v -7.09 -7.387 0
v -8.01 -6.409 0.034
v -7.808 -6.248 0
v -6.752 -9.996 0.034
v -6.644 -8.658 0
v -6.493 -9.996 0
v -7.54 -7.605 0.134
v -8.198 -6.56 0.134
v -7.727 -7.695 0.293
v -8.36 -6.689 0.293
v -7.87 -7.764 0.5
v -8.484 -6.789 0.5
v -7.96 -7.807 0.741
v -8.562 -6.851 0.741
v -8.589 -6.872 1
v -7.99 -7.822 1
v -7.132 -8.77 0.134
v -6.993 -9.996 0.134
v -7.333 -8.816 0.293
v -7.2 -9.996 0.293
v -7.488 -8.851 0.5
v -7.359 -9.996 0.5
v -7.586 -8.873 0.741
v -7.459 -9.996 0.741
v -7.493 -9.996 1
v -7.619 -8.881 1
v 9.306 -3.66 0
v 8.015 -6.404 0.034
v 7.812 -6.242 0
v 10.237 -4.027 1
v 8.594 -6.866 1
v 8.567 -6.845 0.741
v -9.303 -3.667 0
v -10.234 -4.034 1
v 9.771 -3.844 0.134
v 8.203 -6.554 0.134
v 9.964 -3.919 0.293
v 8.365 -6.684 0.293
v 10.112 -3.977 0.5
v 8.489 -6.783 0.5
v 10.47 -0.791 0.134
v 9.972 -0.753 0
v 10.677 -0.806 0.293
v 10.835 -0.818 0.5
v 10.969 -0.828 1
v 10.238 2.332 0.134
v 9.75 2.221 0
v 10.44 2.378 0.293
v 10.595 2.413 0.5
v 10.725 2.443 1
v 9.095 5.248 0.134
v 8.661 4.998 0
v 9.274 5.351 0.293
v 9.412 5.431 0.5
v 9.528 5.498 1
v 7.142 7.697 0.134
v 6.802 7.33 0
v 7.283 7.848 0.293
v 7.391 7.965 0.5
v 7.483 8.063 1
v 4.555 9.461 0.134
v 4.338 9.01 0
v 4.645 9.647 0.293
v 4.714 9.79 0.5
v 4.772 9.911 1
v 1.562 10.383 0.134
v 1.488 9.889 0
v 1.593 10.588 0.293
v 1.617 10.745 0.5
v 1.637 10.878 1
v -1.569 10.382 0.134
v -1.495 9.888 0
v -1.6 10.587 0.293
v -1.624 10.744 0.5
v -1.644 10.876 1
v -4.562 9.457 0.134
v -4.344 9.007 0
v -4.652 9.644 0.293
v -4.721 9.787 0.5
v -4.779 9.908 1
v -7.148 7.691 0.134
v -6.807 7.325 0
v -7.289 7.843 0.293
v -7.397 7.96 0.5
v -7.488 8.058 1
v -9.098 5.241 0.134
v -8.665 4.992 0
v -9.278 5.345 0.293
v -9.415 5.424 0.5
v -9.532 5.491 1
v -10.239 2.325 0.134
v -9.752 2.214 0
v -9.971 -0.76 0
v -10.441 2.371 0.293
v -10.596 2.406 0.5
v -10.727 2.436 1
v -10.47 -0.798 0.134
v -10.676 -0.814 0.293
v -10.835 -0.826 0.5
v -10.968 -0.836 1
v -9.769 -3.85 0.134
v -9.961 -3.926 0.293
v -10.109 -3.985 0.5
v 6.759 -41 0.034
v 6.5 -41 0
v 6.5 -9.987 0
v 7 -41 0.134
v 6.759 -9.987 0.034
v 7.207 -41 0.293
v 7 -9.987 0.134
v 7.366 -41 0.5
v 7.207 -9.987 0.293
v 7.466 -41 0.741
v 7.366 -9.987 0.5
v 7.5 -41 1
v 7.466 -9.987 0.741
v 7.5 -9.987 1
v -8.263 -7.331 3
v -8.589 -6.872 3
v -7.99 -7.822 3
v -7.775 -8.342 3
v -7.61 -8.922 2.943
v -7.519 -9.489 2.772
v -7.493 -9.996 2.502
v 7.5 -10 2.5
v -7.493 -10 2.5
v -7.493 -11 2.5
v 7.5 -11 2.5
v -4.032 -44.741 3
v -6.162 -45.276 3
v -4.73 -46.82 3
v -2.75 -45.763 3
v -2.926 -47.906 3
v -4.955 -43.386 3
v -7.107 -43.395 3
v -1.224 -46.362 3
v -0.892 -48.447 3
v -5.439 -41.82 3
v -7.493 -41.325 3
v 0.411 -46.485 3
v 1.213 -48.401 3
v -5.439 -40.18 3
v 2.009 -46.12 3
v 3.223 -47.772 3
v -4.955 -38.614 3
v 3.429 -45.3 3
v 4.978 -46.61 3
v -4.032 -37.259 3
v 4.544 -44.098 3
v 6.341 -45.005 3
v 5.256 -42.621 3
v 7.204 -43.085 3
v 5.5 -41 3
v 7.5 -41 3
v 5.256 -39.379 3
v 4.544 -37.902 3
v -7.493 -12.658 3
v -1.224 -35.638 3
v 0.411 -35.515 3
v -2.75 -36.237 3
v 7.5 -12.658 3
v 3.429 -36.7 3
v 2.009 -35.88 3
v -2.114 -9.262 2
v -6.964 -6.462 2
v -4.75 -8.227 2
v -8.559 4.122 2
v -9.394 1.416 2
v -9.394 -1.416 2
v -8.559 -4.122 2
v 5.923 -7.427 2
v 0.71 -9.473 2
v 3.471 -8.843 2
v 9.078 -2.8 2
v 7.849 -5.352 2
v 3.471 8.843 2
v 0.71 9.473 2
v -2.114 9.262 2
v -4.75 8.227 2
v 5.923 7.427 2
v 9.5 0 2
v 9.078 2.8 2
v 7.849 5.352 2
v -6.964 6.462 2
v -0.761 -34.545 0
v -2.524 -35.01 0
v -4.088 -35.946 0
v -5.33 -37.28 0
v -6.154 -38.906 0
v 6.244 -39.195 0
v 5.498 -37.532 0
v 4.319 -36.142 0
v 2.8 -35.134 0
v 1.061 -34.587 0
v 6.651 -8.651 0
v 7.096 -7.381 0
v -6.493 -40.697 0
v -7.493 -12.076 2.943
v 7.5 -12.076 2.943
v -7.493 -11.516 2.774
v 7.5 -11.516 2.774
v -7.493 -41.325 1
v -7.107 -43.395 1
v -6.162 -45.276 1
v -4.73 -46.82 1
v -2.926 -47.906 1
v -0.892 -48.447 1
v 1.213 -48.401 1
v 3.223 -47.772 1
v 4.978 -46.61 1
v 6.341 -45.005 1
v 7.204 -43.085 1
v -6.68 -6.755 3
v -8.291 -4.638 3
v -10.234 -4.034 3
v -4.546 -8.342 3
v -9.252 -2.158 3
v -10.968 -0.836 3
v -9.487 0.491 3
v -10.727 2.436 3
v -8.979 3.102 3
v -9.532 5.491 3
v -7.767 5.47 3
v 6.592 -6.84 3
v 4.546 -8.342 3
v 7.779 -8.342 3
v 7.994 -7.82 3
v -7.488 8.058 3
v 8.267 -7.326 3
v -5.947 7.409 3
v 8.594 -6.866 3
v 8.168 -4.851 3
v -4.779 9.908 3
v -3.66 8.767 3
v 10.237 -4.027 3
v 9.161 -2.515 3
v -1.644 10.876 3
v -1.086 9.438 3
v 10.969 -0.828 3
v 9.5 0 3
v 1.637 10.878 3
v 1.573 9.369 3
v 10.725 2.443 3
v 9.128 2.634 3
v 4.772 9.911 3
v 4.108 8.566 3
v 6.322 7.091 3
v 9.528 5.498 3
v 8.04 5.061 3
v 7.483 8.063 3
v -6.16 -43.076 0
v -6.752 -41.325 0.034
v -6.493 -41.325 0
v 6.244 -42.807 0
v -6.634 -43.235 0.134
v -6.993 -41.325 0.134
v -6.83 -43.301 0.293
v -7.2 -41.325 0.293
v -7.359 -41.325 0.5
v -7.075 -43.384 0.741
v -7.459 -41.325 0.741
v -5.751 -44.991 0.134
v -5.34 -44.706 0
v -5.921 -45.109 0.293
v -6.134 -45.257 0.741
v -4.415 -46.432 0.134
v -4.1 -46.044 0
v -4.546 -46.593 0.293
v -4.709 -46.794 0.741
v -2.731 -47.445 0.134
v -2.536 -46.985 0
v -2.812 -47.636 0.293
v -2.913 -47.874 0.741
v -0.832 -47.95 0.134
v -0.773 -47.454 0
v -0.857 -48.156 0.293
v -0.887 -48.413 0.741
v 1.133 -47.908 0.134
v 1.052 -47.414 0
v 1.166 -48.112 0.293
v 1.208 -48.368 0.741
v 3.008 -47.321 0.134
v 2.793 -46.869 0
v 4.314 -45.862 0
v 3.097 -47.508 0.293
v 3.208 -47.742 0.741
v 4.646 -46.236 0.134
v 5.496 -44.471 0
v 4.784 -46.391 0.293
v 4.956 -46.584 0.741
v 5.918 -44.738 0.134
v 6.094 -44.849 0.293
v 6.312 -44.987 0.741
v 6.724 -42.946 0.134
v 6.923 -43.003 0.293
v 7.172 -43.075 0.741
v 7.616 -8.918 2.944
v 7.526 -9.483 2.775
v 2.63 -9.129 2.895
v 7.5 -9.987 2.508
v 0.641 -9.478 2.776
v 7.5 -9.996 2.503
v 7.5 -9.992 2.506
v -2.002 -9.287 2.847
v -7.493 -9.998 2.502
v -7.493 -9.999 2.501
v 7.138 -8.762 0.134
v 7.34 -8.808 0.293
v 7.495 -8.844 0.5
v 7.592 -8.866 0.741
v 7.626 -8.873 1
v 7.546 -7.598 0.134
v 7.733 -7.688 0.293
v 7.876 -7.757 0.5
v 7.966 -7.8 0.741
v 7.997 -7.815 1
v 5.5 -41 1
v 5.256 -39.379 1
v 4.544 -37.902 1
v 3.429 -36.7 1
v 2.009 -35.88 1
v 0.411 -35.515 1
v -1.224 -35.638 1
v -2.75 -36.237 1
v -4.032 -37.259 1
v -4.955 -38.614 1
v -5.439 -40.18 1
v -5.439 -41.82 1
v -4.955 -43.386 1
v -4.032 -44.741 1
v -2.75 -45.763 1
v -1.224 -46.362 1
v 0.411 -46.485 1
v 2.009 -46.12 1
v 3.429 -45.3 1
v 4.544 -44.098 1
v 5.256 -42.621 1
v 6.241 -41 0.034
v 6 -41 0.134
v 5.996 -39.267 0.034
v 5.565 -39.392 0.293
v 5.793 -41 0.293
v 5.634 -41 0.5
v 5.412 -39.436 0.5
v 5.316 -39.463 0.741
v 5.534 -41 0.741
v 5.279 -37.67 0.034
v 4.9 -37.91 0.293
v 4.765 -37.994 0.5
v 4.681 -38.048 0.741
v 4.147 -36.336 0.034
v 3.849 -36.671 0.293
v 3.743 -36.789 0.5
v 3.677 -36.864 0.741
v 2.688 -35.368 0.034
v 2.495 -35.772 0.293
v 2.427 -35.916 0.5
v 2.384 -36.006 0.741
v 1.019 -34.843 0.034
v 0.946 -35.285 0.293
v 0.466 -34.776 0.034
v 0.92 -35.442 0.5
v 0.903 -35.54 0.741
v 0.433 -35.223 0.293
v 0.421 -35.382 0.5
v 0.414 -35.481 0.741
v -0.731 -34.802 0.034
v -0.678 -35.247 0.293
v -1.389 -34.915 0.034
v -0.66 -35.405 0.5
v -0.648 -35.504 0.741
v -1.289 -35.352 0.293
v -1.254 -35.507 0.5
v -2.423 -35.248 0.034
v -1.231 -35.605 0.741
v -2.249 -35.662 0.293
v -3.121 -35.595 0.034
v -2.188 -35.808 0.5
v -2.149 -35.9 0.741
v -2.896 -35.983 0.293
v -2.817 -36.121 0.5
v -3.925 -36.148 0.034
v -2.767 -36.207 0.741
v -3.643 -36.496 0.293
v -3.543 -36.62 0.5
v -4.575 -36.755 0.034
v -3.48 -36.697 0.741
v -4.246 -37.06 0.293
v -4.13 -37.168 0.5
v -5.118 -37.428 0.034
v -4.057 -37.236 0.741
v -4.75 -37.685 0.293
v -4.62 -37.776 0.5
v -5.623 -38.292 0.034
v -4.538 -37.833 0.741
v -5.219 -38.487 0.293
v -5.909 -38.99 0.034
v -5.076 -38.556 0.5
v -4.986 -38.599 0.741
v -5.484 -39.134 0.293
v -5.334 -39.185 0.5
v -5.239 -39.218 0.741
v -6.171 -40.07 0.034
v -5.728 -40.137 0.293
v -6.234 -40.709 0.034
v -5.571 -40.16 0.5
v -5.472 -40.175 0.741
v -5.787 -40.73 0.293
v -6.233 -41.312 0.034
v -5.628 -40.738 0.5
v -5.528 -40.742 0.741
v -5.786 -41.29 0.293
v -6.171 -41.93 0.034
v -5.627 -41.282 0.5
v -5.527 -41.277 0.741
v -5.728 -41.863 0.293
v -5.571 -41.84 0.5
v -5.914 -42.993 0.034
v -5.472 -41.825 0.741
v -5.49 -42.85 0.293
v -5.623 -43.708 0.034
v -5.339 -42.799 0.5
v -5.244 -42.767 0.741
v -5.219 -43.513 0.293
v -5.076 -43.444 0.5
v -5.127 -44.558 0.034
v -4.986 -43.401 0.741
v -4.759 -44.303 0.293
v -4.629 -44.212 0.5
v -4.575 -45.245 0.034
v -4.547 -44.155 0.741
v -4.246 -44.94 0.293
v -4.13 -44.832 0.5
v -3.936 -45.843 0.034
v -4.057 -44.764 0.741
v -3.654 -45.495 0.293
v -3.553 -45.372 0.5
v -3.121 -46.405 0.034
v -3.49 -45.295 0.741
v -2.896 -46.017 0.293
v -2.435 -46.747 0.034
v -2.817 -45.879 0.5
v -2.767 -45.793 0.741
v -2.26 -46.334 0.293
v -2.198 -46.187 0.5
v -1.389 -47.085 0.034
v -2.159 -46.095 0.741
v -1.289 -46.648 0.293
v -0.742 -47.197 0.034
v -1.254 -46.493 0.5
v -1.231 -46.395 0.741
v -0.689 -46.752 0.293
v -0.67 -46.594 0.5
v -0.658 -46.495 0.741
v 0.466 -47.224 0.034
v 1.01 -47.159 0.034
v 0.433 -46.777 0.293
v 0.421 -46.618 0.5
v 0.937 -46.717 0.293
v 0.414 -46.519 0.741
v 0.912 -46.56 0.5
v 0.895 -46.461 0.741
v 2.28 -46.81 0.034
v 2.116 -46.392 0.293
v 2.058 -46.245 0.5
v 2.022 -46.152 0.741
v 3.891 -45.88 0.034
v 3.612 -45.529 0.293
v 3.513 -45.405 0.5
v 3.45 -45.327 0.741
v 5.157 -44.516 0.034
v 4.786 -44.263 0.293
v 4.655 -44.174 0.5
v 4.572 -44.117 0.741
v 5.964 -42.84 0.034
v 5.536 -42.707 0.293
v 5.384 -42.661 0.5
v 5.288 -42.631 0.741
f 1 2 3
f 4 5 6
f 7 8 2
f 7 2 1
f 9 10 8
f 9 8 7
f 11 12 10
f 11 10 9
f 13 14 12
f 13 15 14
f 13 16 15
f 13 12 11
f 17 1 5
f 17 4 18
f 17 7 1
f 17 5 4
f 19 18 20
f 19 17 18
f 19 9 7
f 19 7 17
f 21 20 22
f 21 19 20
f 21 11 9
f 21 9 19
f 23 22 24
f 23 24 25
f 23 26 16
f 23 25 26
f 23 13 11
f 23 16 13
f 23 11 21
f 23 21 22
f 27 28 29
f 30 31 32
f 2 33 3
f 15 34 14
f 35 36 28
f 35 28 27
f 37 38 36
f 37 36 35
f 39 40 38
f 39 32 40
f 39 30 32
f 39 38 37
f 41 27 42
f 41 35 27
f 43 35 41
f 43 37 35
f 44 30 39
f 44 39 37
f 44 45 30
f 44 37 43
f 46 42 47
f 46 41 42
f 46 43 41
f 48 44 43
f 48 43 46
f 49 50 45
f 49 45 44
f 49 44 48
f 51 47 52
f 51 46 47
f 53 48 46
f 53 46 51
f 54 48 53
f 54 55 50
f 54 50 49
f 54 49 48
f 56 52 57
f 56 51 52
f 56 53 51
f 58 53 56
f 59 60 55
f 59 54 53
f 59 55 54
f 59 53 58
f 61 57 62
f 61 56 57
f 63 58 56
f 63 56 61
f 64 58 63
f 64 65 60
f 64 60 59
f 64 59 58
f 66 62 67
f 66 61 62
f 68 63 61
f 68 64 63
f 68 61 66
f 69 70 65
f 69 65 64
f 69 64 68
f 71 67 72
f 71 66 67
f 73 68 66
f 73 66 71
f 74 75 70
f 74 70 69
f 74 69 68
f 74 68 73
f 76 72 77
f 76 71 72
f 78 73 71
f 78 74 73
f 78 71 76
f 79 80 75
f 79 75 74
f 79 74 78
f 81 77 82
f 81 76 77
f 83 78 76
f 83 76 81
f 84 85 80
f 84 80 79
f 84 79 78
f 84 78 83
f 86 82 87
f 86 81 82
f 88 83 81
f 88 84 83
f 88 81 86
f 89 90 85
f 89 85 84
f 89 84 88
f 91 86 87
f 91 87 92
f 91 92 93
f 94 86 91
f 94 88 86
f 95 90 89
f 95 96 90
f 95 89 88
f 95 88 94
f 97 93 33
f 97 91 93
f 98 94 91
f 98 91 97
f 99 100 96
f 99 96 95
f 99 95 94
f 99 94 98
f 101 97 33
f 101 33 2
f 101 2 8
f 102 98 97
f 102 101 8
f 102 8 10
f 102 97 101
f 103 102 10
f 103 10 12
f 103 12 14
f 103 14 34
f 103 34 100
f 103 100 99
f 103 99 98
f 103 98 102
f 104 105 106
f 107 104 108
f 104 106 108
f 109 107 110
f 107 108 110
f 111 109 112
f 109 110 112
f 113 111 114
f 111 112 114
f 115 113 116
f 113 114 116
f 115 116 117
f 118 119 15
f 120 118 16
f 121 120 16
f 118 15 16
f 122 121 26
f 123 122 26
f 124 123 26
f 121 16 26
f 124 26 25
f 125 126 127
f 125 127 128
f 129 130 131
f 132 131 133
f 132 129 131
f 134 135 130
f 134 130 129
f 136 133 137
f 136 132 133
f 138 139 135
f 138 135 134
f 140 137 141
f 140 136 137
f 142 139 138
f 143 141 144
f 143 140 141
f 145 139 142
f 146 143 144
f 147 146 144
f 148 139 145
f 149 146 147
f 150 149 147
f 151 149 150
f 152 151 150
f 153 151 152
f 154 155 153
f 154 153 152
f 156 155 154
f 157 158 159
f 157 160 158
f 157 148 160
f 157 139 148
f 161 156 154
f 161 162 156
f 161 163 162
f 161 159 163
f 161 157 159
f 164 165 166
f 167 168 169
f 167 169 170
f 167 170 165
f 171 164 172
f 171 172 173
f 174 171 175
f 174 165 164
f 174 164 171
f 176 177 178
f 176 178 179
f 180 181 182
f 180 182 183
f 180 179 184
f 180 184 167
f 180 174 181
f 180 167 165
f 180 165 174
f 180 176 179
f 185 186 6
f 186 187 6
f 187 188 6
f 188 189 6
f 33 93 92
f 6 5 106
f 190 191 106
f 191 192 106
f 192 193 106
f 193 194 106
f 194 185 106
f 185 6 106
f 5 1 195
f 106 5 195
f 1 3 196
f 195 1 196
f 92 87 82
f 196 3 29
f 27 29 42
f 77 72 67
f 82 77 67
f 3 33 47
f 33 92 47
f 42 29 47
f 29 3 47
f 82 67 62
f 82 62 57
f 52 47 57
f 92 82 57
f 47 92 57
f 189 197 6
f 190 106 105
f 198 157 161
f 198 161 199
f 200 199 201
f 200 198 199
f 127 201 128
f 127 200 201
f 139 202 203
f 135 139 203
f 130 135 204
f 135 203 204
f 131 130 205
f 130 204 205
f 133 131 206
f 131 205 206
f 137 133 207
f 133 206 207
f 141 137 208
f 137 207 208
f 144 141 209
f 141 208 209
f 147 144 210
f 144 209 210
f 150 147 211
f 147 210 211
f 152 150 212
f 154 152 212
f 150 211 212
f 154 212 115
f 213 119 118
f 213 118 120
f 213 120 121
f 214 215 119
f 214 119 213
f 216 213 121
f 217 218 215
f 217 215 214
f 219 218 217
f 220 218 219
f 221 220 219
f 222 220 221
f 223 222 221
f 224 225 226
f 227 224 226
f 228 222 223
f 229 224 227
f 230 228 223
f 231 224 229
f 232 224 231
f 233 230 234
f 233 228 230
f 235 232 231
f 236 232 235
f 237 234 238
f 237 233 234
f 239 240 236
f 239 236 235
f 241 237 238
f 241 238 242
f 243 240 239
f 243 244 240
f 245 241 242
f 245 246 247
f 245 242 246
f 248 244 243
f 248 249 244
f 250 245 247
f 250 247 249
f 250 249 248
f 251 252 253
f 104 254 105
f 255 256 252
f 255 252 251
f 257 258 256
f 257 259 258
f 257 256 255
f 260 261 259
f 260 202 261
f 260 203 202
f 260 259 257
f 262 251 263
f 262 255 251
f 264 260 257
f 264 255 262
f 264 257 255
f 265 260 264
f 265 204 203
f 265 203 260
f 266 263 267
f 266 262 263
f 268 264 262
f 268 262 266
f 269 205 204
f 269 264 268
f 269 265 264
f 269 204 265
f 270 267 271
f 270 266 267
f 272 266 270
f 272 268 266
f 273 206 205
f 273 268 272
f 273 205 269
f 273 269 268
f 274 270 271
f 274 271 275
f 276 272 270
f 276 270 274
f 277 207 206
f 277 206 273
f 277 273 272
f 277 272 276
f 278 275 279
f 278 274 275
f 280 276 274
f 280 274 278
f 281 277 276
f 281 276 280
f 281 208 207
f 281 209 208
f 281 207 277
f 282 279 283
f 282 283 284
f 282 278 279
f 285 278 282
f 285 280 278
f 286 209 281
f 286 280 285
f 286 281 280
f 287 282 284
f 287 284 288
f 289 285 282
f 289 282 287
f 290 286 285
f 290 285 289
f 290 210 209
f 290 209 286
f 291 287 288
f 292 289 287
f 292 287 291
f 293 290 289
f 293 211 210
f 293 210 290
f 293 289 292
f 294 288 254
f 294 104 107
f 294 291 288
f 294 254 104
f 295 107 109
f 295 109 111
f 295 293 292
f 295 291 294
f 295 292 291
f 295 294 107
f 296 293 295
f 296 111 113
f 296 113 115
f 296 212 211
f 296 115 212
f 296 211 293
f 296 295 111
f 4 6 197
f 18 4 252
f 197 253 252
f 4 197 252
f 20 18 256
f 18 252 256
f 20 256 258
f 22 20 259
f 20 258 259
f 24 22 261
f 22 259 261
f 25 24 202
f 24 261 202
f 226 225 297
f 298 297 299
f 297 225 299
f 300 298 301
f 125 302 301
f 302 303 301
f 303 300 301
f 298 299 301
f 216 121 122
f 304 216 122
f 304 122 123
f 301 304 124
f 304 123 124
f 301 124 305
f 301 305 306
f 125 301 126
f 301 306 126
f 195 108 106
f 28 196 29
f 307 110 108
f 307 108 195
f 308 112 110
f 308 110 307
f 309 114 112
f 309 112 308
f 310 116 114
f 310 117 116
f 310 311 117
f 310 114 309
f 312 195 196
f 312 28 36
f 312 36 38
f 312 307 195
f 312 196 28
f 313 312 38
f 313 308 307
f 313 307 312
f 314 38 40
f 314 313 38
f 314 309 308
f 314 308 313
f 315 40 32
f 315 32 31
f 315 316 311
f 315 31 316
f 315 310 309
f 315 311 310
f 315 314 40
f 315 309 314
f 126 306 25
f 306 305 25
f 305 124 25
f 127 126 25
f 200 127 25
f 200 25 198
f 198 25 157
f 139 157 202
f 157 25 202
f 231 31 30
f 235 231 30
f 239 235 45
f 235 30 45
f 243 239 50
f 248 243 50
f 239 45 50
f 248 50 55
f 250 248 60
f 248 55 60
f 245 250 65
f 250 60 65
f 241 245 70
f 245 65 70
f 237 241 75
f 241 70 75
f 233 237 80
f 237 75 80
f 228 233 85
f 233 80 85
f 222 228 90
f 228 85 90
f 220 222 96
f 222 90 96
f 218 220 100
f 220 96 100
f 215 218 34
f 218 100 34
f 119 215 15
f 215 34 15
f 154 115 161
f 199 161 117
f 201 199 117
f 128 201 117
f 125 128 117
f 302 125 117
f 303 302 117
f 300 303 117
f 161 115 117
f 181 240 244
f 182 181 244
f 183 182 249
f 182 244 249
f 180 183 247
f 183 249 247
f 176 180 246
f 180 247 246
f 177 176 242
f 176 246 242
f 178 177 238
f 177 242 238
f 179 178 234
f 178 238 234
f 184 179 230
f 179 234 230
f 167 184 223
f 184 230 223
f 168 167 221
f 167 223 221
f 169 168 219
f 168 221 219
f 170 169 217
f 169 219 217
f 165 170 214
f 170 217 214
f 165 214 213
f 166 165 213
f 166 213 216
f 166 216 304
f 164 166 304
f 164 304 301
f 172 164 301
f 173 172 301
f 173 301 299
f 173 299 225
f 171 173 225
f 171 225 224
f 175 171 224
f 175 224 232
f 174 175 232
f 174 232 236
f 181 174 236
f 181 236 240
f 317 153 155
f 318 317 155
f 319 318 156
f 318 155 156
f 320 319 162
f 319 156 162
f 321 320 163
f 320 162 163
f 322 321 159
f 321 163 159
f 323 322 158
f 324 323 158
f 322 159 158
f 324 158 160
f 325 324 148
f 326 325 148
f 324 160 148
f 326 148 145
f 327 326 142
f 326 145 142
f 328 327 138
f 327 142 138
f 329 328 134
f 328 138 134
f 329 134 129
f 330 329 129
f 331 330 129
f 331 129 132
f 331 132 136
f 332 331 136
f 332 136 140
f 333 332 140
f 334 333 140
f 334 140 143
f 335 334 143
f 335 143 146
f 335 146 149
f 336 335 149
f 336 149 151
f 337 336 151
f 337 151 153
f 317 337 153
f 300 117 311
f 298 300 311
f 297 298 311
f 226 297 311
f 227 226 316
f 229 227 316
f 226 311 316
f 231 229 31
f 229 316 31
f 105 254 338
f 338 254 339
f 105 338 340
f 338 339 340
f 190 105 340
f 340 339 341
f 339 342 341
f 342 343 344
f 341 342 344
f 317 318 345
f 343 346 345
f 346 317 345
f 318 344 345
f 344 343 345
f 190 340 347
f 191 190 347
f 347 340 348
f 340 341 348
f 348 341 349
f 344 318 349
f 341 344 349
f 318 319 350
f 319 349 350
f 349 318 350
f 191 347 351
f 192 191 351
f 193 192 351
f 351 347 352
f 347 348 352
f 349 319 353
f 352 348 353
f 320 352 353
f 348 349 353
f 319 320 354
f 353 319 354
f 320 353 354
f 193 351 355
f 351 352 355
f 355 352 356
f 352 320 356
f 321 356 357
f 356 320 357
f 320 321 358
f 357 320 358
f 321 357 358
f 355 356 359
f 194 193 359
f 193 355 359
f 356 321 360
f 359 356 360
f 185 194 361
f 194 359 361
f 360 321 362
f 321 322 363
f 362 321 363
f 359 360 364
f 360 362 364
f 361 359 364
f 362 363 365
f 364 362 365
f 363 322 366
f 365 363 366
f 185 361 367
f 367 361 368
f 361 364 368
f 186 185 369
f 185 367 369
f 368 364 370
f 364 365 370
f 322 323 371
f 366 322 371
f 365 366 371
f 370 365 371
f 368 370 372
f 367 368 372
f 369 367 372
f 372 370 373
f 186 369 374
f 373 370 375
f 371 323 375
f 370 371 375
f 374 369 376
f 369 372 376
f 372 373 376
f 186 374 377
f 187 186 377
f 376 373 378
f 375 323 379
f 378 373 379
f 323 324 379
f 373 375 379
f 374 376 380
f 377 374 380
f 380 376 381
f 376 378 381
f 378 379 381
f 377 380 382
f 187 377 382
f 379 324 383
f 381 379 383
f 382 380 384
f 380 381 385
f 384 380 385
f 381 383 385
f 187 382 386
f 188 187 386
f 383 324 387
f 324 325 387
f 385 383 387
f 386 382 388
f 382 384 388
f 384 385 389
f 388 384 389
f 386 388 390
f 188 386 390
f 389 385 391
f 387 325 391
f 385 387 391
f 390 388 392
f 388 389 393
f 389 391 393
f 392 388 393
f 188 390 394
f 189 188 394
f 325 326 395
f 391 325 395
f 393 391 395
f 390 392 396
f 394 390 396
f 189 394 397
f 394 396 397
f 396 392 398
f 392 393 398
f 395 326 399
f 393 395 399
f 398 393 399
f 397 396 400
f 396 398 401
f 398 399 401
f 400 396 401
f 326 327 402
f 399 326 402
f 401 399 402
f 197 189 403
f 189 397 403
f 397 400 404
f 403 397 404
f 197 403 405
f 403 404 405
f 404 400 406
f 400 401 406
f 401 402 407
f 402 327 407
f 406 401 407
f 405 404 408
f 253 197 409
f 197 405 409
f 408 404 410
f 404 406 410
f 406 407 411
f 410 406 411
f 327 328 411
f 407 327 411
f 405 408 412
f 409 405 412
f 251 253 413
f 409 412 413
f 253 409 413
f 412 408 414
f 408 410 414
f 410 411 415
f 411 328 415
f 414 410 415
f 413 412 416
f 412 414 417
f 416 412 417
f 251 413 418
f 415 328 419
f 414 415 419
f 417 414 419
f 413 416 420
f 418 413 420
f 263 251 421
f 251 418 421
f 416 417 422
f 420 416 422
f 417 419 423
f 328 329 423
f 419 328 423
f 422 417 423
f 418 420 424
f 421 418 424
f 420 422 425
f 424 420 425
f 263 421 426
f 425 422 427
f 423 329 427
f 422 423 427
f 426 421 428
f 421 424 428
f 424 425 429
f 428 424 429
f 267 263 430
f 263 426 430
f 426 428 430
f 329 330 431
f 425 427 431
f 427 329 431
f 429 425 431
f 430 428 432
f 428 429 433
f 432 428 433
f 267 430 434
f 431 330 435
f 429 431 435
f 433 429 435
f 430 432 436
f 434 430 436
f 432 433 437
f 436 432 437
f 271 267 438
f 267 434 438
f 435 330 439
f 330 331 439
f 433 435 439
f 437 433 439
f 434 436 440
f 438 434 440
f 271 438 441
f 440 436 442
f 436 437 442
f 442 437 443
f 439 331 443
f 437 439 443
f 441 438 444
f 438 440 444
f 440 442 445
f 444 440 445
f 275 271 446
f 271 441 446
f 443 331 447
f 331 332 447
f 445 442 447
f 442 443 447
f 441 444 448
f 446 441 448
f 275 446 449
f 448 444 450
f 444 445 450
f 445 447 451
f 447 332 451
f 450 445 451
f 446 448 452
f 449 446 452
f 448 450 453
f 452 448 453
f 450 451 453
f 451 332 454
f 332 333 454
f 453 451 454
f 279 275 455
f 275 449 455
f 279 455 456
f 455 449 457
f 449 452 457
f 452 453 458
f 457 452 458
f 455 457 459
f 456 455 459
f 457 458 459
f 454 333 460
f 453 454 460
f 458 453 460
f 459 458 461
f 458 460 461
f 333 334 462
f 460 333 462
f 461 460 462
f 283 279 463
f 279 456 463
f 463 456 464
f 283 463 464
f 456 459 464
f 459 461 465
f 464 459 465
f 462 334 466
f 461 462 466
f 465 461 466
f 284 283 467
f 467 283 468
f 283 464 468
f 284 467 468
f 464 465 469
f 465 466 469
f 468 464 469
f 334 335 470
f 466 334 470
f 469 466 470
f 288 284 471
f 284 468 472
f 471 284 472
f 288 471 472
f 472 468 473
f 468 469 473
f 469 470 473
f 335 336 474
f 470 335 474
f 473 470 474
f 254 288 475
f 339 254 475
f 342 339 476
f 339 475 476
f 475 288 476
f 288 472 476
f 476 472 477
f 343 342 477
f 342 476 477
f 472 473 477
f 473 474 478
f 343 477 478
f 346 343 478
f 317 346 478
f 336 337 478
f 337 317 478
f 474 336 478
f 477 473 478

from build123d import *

# Parameters (mm, degrees)
F1_DEPTH    = 3
F2_R        = 9.5
F3_DEPTH    = 1
F4_W        = 14.9929515668
F4_H        = 1
F5_DEPTH    = 0.5
F6_T1_DEPTH = 23.2845135427
F7_R        = 5.5
F8_DEPTH    = 3.0010001
F9_F1_R     = 1


# Not quite as in the source:
# - a fillet or chamfer that OpenCascade refuses, or shapes differently, is made with other operations: its cross-section is extruded or revolved along the edge and cut away or added


with BuildPart() as f1:
    # F0 (on Top) → F1 (new body)
    with BuildSketch(Plane.XY):
        with BuildLine():
            ThreePointArc((7.5, -9.9874921777), (7.781353478, -8.3338976083), (8.59375, -6.8664008722))
            ThreePointArc((8.59375, -6.8664008722), (-0.0038797807, 10.9999993158), (-8.5889042022, -6.8724613208))
            ThreePointArc((-8.5889042022, -6.8724613208), (-7.7748885732, -8.3410486079), (-7.4929515668, -9.9963073757))
            Line((-7.4929515668, -9.9963073757), (-7.4929515668, -40.6749202897))
            Line((-7.4929515668, -40.6749202897), (-7.4929515668, -41.3250797103))
            ThreePointArc((-7.4929515668, -41.3250797103), (0.162578057, -48.4982376846), (7.5, -41))
            Line((7.5, -41), (7.5, -9.9874921777))
        make_face()
    extrude(amount=F1_DEPTH)

    # F2 (on face) → F3 (cut)
    with BuildSketch(Plane.XY.offset(3)):
        Circle(F2_R)
    extrude(amount=-F3_DEPTH, mode=Mode.SUBTRACT)

    # F4 (on face) → F5 (cut)
    with BuildSketch(Plane.XY.offset(3)):
        with Locations((0.0035242166, -10.5)):
            Rectangle(F4_W, F4_H)
    extrude(amount=-F5_DEPTH, mode=Mode.SUBTRACT)

    # F6: fillet of radius 3 on 2 edges, made by hand

    # F6_s2 → F6_t1 (cut)
    with BuildSketch(Plane.YZ.offset(-11.6387325547)):
        with BuildLine():
            ThreePointArc((-12.6583123952, 3), (-11.7922869914, 2.8722813233), (-11, 2.5))
            Line((-11, 2.5), (-11, 3))
            Line((-11, 3), (-12.6583123952, 3))
        make_face()
        with BuildLine():
            ThreePointArc((-8.3416876048, 3), (-9.2077130086, 2.8722813233), (-10, 2.5))
            Line((-10, 2.5), (-10, 3))
            Line((-10, 3), (-8.3416876048, 3))
        make_face()
    extrude(amount=F6_T1_DEPTH, mode=Mode.SUBTRACT)

    # F7 (on face) → F8 (cut, through all)
    with BuildSketch(Plane.XY.offset(3)):
        with Locations((0, -41)):
            Circle(F7_R)
    extrude(amount=-F8_DEPTH, mode=Mode.SUBTRACT)

    # F9: fillet of radius 1 on 7 edges, made by hand

    # F9_f1
    f9_f1_edges = [f1.edges().sort_by_distance(p)[0] for p in [
        (-7.7748885732, -8.3410486079, 0),
        (-0.0038797807, 10.9999993158, 0),
        (-7.4929515668, -25.660693543, 0),
        (7.781353478, -8.3338976083, 0),
        (0.162578057, -48.4982376846, 0),
        (7.5, -25.4937460889, 0),
    ]]
    fillet(f9_f1_edges, radius=F9_F1_R)

    # F9_s2 → F9_t3 (revolve, cut)
    with BuildSketch(Plane.XZ.offset(41)):
        with BuildLine():
            ThreePointArc((6.5, 0), (5.7928932188, 0.2928932188), (5.5, 1))
            Line((5.5, 1), (5.48, 1))
            Line((5.48, 1), (5.48, -0.02))
            Line((5.48, -0.02), (6.5, -0.02))
            Line((6.5, -0.02), (6.5, 0))
        make_face()
    revolve(axis=Axis((0, -41, 0), (0, 0, 1)), mode=Mode.SUBTRACT)


solid = f1.part
